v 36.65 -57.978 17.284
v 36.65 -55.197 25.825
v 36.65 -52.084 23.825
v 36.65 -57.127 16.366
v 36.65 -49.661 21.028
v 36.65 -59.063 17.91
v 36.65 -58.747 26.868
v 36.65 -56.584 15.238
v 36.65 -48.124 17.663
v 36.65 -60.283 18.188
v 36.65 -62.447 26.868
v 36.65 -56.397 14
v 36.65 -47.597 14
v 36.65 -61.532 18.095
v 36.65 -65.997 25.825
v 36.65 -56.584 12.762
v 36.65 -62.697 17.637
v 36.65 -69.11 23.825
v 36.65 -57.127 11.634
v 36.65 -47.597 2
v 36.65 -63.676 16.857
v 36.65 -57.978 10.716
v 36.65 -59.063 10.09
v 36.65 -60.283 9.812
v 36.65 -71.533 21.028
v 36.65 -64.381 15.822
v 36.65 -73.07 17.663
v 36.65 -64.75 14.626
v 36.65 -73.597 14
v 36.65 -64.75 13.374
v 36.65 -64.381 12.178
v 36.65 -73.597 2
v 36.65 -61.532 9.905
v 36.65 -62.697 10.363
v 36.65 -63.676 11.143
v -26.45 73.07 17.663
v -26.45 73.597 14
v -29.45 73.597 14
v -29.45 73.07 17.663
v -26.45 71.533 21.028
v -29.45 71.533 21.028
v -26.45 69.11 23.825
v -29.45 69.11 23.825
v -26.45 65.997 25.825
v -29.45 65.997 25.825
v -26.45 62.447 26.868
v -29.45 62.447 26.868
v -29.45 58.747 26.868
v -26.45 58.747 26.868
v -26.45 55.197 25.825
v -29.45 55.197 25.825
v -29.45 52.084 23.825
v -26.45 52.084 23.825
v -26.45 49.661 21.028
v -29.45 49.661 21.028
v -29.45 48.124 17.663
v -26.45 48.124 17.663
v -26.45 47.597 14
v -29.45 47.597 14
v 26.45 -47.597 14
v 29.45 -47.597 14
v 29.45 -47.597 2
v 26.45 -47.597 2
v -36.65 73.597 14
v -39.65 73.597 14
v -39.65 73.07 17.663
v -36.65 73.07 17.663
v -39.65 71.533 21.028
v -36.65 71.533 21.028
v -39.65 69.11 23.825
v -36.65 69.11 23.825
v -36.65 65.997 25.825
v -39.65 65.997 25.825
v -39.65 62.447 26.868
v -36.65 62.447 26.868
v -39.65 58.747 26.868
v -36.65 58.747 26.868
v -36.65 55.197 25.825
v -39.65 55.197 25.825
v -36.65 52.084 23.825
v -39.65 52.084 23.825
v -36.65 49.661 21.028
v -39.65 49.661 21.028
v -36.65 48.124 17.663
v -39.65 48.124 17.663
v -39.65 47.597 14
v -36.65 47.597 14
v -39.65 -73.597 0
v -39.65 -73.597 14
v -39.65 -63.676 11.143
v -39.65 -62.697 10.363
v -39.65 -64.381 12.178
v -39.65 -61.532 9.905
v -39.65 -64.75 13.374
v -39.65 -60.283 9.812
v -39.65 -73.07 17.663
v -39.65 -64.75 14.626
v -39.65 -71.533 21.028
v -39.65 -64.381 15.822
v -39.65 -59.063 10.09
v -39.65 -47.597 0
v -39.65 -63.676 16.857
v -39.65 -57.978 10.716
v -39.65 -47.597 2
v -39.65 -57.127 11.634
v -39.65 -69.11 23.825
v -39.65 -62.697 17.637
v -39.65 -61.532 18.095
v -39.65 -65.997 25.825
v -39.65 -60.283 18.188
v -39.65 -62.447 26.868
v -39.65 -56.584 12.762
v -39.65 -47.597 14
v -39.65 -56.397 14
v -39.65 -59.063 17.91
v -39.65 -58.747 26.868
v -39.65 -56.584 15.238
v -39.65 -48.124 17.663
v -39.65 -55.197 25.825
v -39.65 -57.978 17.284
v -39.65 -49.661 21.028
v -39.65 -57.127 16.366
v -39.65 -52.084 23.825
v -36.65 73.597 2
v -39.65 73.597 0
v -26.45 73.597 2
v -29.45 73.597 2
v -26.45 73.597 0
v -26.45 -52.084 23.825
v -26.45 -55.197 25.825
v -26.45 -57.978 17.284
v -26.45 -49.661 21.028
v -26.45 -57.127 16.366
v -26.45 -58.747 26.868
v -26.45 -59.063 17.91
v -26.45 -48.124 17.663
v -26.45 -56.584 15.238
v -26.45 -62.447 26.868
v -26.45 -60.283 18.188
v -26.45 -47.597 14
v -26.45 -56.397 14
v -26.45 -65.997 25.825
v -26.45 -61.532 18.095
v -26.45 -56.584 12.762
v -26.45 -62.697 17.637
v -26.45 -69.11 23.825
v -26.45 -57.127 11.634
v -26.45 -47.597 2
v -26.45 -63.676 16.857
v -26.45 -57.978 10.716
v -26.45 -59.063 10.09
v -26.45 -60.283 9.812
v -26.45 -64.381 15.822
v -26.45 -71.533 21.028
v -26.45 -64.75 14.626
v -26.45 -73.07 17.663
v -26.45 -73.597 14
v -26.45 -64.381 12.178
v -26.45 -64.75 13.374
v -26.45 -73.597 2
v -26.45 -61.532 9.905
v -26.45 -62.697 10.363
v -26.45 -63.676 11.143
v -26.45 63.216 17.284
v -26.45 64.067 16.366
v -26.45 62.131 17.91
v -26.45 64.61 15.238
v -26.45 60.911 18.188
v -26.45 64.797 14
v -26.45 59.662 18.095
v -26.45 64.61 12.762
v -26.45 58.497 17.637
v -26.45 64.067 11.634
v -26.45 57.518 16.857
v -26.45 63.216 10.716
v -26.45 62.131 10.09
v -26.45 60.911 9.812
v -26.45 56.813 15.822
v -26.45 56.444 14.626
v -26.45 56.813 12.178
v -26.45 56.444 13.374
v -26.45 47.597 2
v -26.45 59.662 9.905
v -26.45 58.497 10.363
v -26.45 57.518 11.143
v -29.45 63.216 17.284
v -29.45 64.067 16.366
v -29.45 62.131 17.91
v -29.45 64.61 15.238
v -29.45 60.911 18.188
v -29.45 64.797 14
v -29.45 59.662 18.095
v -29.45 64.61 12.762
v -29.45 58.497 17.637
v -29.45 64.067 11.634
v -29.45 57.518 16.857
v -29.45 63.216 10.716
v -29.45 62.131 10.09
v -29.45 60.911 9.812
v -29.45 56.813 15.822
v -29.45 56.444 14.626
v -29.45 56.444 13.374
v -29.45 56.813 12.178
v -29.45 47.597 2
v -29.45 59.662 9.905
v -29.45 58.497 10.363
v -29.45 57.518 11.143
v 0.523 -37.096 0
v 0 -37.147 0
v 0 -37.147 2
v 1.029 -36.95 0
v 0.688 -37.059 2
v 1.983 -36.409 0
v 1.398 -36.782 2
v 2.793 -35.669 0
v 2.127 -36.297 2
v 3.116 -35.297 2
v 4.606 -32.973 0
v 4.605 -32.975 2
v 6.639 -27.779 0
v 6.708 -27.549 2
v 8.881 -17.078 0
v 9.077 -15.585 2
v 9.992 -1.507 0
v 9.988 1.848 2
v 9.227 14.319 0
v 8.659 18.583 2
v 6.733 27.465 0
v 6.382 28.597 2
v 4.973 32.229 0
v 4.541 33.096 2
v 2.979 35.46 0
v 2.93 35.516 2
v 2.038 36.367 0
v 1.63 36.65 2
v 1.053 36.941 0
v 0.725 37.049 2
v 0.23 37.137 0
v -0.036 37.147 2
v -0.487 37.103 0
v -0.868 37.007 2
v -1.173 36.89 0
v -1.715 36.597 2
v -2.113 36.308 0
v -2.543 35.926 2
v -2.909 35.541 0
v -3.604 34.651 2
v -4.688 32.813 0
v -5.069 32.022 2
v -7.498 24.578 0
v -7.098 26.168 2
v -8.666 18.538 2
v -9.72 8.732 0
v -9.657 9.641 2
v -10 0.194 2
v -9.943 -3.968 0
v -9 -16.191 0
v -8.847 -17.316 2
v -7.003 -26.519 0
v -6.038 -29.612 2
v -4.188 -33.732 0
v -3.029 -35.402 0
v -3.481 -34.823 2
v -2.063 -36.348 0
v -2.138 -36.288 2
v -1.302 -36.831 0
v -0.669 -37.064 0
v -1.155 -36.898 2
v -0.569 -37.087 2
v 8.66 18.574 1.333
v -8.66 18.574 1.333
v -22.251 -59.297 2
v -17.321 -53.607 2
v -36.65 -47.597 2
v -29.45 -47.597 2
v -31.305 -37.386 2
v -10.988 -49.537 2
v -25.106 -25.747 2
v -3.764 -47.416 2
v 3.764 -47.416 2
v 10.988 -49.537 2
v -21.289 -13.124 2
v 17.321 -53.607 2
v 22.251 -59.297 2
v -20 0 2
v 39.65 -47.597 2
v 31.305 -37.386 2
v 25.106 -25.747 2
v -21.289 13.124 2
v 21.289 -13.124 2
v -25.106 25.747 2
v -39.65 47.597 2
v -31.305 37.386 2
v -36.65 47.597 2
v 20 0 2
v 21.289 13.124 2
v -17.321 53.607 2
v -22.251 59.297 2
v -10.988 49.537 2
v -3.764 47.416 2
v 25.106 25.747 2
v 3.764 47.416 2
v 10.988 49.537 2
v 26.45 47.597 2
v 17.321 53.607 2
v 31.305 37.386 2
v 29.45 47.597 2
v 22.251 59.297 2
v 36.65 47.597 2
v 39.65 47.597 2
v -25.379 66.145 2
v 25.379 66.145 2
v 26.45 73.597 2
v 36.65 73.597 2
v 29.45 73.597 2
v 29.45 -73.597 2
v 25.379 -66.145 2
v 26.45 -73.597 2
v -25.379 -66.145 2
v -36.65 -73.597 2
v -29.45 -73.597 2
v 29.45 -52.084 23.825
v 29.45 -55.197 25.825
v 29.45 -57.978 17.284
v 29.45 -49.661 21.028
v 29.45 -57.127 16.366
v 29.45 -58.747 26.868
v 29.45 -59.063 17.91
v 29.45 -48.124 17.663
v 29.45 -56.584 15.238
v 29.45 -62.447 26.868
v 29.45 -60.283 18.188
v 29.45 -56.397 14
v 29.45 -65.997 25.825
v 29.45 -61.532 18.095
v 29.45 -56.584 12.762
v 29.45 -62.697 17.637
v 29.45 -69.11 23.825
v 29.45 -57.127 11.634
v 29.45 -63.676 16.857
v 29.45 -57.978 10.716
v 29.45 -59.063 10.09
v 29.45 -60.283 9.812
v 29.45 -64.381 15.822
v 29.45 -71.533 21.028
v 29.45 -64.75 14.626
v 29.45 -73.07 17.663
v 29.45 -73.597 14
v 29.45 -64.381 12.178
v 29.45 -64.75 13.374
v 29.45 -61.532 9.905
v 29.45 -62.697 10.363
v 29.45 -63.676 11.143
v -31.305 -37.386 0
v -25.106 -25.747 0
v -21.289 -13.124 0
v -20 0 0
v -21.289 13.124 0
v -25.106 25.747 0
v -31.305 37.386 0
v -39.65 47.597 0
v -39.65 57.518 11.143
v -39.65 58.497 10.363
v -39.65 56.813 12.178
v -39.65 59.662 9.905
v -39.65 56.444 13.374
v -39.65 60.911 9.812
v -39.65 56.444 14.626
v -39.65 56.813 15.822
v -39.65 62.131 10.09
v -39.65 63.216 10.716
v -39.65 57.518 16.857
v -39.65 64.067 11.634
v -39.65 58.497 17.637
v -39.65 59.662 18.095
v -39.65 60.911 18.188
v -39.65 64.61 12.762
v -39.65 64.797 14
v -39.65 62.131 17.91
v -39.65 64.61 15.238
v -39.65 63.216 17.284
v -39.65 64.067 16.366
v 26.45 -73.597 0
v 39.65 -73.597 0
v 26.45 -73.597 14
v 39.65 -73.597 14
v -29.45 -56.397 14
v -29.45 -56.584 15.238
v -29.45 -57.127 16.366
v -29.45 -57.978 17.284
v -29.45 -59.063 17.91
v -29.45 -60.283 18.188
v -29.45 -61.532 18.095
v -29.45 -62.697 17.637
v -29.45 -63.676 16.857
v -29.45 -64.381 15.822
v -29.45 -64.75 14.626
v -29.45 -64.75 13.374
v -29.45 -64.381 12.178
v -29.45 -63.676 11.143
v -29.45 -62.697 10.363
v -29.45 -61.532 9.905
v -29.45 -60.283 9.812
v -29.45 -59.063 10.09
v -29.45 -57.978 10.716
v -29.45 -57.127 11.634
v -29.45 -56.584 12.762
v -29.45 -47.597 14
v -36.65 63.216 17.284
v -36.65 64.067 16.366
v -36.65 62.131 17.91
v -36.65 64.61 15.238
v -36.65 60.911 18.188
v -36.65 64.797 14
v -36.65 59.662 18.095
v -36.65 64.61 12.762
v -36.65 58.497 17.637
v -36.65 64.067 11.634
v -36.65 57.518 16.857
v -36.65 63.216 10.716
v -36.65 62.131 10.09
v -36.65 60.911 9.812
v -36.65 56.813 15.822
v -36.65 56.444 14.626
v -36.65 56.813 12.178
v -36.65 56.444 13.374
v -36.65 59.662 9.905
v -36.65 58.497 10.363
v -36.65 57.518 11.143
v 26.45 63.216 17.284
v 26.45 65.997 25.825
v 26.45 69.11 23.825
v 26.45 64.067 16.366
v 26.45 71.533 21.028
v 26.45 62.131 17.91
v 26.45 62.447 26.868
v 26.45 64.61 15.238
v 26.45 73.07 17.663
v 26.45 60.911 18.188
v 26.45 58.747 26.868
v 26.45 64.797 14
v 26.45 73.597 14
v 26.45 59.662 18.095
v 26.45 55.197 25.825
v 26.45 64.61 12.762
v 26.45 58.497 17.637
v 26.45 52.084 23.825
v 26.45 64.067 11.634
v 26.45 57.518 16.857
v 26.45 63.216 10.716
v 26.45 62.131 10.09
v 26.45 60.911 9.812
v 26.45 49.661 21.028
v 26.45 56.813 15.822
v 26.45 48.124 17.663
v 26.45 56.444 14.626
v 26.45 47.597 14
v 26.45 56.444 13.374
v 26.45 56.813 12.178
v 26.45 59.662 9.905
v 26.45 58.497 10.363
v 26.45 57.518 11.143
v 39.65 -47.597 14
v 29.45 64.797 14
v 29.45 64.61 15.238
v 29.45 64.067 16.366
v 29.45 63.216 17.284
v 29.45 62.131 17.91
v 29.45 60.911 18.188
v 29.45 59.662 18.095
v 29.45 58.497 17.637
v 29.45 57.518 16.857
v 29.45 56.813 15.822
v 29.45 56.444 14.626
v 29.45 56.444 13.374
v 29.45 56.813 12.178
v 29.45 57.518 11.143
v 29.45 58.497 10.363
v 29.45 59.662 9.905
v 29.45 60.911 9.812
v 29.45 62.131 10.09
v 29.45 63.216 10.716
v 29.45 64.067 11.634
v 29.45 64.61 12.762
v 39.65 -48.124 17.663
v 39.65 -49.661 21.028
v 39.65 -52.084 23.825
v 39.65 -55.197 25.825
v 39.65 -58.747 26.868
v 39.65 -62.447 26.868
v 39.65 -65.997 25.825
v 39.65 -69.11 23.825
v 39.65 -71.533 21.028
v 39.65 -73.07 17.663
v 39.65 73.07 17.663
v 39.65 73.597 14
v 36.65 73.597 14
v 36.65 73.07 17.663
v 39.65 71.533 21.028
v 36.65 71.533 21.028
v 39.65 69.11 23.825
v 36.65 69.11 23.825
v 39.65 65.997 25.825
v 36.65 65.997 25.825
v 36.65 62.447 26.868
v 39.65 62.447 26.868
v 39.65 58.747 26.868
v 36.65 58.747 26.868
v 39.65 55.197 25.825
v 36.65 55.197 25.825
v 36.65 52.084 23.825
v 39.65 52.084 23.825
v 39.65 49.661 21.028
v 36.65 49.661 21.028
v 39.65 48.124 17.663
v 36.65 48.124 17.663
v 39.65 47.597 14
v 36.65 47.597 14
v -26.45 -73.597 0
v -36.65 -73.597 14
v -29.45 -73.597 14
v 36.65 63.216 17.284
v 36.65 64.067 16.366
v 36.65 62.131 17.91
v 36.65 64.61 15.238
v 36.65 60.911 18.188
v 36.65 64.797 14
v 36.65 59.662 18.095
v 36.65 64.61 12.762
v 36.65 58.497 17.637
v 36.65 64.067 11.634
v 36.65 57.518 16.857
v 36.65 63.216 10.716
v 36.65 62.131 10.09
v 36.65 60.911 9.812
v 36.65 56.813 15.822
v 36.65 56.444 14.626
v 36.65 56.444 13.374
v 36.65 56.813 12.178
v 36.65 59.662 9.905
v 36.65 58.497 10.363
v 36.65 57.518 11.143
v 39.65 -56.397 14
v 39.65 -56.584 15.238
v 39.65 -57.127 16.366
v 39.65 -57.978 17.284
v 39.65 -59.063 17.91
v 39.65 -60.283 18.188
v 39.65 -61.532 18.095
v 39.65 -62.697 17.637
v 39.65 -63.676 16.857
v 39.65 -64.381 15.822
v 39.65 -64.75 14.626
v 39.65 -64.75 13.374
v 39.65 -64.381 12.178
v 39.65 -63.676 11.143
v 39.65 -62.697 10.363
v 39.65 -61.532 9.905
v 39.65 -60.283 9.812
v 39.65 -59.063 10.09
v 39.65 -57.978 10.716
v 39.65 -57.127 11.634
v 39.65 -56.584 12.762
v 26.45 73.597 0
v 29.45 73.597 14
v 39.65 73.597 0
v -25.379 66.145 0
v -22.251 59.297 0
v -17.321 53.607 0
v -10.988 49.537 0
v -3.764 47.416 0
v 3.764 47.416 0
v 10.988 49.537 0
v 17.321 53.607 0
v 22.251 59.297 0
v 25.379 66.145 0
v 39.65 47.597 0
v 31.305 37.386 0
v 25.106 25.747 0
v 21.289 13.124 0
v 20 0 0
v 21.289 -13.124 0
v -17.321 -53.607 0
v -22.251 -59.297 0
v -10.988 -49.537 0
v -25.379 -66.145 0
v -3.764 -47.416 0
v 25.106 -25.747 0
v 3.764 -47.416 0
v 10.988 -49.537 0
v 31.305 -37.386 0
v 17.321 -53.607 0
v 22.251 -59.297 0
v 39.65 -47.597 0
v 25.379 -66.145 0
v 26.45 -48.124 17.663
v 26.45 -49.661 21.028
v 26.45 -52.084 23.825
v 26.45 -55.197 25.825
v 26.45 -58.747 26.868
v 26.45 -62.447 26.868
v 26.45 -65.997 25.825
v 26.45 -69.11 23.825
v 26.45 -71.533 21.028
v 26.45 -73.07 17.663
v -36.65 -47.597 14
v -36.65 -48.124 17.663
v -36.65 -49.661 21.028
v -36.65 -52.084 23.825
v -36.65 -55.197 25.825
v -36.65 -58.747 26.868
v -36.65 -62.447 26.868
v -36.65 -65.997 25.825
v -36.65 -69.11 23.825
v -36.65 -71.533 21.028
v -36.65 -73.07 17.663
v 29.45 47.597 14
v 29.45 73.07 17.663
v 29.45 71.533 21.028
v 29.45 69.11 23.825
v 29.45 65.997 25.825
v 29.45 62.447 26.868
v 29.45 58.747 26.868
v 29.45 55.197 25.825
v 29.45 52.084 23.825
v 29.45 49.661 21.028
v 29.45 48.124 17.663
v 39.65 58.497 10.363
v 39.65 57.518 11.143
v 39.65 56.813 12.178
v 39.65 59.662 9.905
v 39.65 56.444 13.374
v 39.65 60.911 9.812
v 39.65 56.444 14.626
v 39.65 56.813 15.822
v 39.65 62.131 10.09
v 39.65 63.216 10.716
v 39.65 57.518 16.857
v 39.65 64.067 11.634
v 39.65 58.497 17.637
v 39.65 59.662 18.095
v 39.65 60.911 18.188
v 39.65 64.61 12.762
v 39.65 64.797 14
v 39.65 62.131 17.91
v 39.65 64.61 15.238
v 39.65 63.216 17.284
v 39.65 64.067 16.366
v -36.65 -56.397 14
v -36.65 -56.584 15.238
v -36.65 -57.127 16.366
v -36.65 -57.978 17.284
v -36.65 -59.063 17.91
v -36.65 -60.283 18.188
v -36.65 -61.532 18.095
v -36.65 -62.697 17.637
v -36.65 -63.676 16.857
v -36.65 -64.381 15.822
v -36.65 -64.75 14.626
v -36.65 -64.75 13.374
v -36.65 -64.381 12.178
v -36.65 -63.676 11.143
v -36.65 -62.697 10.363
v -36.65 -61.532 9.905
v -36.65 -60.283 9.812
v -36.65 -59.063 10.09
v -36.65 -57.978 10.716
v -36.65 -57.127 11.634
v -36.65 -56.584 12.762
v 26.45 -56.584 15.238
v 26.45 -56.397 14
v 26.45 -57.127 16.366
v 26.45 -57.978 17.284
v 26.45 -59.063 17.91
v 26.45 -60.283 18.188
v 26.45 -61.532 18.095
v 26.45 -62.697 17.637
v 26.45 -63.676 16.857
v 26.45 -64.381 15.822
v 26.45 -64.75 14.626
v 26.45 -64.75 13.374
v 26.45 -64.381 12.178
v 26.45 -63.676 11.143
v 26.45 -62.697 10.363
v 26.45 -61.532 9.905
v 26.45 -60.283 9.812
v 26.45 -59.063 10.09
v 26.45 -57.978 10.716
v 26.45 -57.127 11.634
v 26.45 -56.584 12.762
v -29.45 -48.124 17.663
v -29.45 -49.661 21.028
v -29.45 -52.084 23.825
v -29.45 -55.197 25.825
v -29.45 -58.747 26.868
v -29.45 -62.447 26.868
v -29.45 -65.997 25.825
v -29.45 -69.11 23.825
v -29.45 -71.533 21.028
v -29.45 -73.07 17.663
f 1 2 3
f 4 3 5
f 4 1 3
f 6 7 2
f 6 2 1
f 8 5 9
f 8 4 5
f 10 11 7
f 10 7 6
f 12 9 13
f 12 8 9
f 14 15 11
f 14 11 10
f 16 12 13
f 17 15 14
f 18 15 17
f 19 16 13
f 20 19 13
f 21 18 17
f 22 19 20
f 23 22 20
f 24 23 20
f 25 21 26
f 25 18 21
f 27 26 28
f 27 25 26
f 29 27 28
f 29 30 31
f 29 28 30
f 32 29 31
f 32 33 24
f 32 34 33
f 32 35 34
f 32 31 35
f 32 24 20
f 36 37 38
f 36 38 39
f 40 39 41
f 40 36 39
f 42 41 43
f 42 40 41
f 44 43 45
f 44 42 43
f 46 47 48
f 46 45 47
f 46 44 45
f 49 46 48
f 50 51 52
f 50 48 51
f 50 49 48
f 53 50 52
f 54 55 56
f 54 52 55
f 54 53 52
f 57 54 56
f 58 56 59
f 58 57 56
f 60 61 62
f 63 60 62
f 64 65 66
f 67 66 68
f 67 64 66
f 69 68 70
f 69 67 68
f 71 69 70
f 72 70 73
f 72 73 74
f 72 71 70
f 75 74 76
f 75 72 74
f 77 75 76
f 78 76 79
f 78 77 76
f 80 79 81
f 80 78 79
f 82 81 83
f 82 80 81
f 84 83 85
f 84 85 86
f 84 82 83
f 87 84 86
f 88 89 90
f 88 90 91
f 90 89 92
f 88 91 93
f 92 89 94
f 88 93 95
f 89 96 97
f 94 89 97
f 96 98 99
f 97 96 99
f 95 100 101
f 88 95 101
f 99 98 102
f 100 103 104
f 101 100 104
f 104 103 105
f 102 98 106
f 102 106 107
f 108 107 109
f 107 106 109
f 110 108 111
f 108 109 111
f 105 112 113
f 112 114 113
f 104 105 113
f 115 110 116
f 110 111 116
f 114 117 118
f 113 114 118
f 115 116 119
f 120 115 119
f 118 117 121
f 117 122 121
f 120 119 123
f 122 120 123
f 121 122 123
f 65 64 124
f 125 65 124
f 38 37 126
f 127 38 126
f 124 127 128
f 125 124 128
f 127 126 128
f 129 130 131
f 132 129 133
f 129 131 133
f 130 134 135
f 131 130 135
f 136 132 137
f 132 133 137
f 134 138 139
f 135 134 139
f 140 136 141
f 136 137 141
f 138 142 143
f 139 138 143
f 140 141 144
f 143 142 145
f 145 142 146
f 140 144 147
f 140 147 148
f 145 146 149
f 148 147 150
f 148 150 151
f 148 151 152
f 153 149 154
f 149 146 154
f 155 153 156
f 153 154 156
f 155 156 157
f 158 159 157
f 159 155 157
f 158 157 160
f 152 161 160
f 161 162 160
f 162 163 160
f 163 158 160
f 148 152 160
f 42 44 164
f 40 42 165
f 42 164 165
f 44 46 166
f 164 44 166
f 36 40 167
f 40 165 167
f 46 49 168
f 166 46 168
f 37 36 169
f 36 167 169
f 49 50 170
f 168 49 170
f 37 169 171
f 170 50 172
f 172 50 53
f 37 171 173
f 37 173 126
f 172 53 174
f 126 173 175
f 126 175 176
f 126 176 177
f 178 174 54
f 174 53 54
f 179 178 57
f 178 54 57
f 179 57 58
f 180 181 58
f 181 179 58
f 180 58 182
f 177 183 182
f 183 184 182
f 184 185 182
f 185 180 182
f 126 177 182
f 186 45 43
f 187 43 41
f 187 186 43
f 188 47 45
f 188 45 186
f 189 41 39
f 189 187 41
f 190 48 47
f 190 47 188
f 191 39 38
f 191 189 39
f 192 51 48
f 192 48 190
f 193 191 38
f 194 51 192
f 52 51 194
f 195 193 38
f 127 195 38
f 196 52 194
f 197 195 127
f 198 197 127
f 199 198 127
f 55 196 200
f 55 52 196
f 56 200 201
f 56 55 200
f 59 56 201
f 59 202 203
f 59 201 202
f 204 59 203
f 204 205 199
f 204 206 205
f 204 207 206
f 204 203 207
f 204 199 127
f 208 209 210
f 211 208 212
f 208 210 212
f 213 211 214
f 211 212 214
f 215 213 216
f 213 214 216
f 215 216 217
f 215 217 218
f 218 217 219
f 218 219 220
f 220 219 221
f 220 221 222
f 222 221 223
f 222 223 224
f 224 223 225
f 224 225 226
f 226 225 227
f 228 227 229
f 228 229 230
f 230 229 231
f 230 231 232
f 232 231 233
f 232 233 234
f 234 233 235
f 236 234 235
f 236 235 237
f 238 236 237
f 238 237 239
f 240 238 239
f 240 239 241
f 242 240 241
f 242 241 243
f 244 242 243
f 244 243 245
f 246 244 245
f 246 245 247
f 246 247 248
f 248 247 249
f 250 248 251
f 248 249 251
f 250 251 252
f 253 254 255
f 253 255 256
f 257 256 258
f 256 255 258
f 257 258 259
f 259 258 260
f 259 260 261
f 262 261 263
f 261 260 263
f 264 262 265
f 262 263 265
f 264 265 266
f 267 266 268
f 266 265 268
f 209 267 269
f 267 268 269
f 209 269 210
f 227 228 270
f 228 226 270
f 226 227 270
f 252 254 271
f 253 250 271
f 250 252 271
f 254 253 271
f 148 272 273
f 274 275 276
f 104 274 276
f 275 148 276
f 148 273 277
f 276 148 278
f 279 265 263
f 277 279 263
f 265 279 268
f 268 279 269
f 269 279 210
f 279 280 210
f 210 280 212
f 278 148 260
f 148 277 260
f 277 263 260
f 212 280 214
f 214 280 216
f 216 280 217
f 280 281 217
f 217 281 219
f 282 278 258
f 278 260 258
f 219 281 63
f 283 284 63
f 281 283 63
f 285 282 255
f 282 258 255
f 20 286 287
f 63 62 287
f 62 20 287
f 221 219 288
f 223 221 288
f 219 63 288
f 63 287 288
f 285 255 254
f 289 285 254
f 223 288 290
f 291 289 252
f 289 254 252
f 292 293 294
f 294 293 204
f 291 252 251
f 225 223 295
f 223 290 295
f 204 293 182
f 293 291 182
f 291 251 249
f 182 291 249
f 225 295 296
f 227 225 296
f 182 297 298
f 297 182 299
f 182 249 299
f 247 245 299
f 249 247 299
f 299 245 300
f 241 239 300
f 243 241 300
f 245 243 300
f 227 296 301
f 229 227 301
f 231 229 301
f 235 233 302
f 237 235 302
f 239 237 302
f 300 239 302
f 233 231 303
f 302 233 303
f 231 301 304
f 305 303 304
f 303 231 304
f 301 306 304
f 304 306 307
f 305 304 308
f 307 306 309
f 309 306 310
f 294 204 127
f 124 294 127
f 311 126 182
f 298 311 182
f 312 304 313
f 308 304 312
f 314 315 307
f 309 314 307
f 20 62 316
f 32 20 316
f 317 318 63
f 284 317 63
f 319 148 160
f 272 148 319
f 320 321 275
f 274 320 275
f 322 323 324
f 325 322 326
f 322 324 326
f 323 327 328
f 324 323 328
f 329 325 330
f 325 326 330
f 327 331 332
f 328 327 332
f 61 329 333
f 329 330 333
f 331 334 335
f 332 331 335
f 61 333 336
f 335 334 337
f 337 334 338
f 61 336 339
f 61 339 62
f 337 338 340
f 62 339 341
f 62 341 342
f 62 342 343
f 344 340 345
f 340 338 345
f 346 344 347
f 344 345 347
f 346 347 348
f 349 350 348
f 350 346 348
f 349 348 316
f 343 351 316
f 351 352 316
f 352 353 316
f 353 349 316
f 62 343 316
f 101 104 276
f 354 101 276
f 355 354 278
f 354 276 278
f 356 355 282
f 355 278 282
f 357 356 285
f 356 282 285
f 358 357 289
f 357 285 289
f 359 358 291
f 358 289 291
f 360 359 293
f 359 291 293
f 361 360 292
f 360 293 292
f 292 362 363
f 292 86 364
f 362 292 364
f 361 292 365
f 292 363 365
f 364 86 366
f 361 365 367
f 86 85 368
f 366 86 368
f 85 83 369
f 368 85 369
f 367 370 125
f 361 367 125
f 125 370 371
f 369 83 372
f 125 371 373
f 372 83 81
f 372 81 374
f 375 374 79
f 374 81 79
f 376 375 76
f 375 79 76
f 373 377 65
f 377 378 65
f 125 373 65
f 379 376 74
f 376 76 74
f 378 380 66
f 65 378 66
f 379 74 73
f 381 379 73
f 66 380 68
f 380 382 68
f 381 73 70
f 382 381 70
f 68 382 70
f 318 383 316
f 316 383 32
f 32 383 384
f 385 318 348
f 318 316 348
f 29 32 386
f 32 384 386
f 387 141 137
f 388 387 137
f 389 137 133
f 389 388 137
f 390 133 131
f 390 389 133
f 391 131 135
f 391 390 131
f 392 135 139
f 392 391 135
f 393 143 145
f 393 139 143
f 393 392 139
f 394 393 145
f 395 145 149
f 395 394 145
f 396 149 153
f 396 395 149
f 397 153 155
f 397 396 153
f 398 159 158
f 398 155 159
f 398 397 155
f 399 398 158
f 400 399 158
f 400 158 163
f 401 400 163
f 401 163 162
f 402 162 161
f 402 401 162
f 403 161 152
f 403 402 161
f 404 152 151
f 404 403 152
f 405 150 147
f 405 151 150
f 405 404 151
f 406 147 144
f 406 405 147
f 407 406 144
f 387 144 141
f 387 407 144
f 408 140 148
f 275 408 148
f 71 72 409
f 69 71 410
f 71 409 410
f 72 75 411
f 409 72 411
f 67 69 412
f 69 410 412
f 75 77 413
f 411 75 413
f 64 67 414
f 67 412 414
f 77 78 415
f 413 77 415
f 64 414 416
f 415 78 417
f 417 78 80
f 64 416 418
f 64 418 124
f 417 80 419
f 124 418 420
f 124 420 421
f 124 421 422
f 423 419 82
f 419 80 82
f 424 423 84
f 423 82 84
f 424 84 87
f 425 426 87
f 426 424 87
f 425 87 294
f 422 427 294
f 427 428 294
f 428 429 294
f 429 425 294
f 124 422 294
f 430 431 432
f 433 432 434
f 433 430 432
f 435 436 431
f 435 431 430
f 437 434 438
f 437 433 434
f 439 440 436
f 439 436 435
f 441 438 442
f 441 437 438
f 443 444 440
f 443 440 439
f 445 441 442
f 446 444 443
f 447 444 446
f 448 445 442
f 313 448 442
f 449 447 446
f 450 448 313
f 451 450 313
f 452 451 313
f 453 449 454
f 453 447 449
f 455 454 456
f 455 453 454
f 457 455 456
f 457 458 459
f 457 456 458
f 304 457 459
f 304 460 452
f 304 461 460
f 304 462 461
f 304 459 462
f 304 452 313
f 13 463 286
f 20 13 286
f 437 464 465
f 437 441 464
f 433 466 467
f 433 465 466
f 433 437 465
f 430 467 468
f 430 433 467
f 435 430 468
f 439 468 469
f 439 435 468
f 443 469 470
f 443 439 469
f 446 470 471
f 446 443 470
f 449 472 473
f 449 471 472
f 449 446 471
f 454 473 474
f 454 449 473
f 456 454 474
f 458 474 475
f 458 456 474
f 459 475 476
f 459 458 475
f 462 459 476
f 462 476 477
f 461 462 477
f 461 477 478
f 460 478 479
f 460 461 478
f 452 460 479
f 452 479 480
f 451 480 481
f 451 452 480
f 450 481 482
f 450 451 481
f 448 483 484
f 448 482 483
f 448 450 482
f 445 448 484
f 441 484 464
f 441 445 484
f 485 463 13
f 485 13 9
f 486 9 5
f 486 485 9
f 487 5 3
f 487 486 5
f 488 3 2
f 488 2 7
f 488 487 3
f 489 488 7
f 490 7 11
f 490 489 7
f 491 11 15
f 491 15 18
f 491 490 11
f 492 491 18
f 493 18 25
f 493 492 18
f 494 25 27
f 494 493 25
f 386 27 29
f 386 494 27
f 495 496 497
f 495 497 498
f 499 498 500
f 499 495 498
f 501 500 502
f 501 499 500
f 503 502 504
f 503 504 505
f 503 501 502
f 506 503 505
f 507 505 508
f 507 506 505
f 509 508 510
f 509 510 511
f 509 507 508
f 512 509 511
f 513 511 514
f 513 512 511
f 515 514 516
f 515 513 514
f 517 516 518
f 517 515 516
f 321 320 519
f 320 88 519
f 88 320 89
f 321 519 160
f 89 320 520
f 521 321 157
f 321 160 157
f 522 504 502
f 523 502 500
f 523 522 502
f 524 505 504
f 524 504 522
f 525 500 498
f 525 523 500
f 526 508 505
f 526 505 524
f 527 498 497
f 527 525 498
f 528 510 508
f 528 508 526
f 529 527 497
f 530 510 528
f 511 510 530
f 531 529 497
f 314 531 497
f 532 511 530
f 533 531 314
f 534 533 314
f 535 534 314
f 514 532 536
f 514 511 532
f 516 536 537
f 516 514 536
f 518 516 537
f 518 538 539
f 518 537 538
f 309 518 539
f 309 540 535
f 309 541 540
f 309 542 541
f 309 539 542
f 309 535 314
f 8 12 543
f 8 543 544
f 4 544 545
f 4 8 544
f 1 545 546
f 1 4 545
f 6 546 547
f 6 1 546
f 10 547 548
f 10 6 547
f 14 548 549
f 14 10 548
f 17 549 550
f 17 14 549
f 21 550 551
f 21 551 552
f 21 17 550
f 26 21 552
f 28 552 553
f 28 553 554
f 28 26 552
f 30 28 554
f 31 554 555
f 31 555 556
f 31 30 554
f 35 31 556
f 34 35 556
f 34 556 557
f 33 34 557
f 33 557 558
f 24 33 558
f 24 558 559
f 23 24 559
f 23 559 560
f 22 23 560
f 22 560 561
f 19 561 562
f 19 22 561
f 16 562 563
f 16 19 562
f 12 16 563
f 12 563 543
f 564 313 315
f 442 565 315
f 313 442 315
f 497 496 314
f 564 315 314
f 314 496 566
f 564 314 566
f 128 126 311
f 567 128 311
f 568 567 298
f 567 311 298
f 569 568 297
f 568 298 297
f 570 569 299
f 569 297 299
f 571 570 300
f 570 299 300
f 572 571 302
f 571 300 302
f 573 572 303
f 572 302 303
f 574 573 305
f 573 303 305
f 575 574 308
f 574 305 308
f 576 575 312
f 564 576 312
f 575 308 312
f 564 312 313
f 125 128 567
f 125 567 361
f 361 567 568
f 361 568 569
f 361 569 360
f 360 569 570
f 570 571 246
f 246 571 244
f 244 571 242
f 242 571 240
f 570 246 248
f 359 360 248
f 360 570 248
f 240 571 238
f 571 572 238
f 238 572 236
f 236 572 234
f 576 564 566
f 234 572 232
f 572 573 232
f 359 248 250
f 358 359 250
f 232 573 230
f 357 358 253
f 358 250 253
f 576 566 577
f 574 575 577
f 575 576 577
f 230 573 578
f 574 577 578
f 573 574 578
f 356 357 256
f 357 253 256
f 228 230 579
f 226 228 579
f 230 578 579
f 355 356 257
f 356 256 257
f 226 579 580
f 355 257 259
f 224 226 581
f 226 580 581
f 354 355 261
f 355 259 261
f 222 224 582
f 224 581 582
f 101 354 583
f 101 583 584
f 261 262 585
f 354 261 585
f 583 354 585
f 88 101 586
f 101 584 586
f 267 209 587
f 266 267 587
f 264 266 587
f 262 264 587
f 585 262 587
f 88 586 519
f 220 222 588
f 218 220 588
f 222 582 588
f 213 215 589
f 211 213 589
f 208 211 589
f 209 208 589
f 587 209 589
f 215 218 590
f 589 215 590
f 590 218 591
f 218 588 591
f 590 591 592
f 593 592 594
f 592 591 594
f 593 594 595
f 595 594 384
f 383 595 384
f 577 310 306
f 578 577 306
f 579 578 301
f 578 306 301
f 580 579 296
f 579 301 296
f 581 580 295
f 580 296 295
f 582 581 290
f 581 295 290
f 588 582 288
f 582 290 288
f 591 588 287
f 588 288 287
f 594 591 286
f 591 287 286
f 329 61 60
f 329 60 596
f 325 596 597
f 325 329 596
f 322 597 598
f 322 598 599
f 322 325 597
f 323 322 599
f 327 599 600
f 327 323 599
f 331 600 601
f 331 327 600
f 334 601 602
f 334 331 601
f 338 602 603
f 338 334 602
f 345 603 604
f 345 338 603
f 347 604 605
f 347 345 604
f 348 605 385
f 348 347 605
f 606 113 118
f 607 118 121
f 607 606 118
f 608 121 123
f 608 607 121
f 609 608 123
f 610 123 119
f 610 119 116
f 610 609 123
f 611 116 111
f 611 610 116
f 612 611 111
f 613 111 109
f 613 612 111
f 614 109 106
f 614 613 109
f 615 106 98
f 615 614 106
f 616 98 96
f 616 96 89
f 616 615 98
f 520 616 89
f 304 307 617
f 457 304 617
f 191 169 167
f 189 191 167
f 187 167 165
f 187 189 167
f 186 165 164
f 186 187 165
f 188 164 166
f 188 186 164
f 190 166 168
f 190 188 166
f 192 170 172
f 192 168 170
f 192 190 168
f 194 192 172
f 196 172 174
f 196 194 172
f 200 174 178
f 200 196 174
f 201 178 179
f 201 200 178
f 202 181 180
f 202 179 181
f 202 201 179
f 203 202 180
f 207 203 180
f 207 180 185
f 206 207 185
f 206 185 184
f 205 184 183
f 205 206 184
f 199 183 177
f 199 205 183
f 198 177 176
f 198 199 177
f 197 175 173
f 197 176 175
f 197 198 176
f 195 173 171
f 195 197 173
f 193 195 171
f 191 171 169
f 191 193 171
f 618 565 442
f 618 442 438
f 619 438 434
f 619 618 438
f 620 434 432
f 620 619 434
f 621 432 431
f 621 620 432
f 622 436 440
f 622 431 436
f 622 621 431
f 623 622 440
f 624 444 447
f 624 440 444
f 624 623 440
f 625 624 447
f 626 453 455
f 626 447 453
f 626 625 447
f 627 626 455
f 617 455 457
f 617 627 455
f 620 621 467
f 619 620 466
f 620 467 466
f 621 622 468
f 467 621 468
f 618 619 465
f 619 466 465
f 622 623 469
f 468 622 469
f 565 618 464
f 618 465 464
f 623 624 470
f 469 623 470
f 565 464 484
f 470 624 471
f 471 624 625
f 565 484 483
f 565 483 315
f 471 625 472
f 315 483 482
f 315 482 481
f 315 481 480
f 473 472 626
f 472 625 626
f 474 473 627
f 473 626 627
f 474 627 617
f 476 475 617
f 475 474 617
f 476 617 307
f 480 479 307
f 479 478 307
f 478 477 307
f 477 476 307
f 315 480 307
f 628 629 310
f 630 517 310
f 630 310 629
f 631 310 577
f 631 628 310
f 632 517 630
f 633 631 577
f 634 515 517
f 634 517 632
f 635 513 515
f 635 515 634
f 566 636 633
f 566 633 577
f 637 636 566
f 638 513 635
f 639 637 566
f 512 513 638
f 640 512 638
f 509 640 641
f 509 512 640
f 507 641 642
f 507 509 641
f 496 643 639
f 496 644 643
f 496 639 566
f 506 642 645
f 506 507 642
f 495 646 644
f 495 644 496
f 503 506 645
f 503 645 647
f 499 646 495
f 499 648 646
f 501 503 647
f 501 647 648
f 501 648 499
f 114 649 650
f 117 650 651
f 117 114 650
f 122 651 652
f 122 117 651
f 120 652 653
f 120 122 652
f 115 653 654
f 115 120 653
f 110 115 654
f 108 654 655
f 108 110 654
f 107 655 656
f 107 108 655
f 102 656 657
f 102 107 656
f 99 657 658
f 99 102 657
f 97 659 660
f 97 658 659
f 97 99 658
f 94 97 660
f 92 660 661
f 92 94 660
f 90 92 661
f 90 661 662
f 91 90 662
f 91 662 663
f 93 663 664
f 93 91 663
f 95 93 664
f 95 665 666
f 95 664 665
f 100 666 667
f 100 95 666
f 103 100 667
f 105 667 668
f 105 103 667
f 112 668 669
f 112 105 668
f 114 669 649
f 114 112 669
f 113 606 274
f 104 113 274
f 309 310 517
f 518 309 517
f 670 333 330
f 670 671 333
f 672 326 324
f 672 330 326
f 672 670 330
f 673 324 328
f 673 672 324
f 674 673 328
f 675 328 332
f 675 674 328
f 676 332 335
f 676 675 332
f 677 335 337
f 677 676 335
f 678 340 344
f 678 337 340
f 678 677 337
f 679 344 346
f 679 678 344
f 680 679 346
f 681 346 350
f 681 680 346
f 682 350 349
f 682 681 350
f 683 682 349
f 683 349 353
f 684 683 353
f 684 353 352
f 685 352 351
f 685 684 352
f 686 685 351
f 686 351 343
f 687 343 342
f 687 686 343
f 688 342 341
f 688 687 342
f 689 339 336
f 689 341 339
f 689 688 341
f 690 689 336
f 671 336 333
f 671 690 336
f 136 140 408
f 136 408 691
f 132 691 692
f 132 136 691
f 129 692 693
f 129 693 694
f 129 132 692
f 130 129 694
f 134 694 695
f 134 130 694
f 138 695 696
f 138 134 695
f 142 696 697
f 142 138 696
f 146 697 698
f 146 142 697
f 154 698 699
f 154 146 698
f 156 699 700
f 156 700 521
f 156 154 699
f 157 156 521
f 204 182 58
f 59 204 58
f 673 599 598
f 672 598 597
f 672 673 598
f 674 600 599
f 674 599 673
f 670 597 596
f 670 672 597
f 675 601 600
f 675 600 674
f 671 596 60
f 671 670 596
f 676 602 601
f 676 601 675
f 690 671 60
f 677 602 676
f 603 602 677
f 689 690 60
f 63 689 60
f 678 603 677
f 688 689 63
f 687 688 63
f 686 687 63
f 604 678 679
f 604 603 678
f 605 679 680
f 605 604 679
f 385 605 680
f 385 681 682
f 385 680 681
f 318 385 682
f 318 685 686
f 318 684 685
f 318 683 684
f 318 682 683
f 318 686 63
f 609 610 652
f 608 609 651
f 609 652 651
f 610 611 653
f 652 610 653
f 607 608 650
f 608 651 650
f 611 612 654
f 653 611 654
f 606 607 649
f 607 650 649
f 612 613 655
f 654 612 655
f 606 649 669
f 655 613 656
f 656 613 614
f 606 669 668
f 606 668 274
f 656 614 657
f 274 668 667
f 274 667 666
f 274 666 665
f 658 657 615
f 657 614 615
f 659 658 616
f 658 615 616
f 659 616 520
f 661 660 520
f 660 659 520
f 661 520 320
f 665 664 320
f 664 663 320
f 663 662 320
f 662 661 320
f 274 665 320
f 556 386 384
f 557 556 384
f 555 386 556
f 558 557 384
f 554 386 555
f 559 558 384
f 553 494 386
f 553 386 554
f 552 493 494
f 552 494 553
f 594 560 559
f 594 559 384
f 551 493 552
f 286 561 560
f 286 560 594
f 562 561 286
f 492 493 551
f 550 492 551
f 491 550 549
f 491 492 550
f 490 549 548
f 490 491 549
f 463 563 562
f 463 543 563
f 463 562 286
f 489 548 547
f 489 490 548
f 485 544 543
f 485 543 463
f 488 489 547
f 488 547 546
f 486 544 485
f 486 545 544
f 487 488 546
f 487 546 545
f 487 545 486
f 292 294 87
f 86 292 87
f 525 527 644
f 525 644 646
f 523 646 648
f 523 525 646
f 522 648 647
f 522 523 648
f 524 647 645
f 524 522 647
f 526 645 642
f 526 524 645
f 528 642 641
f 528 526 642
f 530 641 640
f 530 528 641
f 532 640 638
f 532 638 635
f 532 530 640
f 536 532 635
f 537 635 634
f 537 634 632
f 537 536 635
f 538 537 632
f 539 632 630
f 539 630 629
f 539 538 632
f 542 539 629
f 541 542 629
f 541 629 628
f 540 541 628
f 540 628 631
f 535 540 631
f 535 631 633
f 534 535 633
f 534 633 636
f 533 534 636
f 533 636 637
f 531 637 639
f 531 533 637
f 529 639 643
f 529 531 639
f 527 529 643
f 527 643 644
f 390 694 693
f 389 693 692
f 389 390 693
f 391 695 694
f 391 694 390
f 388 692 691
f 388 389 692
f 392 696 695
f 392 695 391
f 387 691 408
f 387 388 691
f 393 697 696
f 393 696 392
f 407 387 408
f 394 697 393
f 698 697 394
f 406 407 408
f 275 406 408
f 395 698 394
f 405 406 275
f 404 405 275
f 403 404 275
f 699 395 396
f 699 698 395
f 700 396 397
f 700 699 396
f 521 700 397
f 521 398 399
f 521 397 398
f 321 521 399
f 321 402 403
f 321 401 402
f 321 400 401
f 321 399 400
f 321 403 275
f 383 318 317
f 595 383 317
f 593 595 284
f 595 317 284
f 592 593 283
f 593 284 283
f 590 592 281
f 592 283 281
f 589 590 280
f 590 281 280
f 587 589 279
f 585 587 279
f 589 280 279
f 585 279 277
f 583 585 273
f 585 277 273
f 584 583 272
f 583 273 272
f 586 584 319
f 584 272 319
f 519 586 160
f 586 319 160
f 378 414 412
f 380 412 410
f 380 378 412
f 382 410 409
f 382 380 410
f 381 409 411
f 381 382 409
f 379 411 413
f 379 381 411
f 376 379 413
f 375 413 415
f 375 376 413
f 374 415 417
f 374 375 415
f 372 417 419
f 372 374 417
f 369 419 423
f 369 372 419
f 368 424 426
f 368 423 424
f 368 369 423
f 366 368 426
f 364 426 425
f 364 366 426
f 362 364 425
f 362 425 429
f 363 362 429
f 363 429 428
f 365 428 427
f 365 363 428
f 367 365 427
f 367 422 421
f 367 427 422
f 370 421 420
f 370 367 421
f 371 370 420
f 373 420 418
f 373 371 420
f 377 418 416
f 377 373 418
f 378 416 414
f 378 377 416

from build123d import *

# Parameters (mm, degrees)
SKETCH_R        = 4.2
PAD_DEPTH       = 39.65
SKETCH001_W     = 25
SKETCH001_H     = 52.9
SKETCH001_H_2   = 7.2
POCKET_DEPTH    = 147.1950592603
POCKET001_DEPTH = 2.001


with BuildPart() as part:
    # Sketch → Pad (new body, symmetric)
    with BuildSketch(Plane.YZ):
        with BuildLine():
            ThreePointArc((-47.5970296302, 14), (-60.5970296302, 27), (-73.5970296302, 14))
            Line((-73.5970296302, 0), (-73.5970296302, 14))
            Line((73.5970296302, 0), (-73.5970296302, 0))
            Line((73.5970296302, 14), (73.5970296302, 0))
            ThreePointArc((73.5970296302, 14), (60.5970296302, 27), (47.5970296302, 14))
            Line((47.5970296302, 2), (47.5970296302, 14))
            Line((-47.5970296302, 2), (47.5970296302, 2))
            Line((-47.5970296302, 14), (-47.5970296302, 2))
        make_face()
        with Locations((60.5970296302, 14)):
            Circle(SKETCH_R, mode=Mode.SUBTRACT)
        with Locations((-60.5970296302, 14)):
            Circle(SKETCH_R, mode=Mode.SUBTRACT)
    extrude(amount=PAD_DEPTH, both=True)

    # Sketch001 (on Face2 of Pad) → Pocket (cut, through all)
    with BuildSketch(Plane(origin=(0, -73.5970296302, 0), x_dir=(0, 0, -1), z_dir=(0, -1, 0))):
        with Locations((-14.5, 0)):
            Rectangle(SKETCH001_W, SKETCH001_H)
        with Locations((-14.5, 33.05)):
            Rectangle(SKETCH001_W, SKETCH001_H_2)
        with Locations((-14.5, -33.05)):
            Rectangle(SKETCH001_W, SKETCH001_H_2)
    extrude(amount=-POCKET_DEPTH, mode=Mode.SUBTRACT)

    # Sketch002 (on Face42 of Pocket) → Pocket001 (cut, through all)
    with BuildSketch(Plane(origin=(0, 0, 2), x_dir=(0, -1, 0), z_dir=(0, 0, 1))):
        with BuildLine():
            Line((-73.5970296302, 26.45), (-73.5970296302, -26.45))
            ThreePointArc((-73.5970296302, -26.45), (-47.1470296302, 0), (-73.5970296302, 26.45))
        make_face()
        with BuildLine():
            Line((-47.5970296302, -39.65), (47.5970296302, -39.65))
            ThreePointArc((47.5970296302, -39.65), (0, -20), (-47.5970296302, -39.65))
        make_face()
        with BuildLine():
            Line((73.5970296302, -26.45), (73.5970296302, 26.45))
            ThreePointArc((73.5970296302, 26.45), (47.1470314394, 0), (73.5970296302, -26.45))
        make_face()
        with BuildLine():
            Line((47.5970296302, 39.65), (-47.5970296302, 39.65))
            ThreePointArc((-47.5970296302, 39.65), (0, 20), (47.5970296302, 39.65))
        make_face()
        with BuildLine():
            add(Edge.make_bspline(
                [(37.1470296302, 0), (37.1470296302, 17.3205080757), (-18.5735148151, 8.6602540378), (-74.2940592603, 0), (-18.5735148151, -8.6602540378), (37.1470296302, -17.3205080757), (37.1470296302, 0)],
                knots=[0, 0, 0, 2.0943951024, 2.0943951024, 4.1887902048, 4.1887902048, 6.2831853072, 6.2831853072, 6.2831853072], degree=2, weights=[1, 0.5, 1, 0.5, 1, 0.5, 1]))
        make_face()
    extrude(amount=-POCKET001_DEPTH, mode=Mode.SUBTRACT)


solid = part.part
